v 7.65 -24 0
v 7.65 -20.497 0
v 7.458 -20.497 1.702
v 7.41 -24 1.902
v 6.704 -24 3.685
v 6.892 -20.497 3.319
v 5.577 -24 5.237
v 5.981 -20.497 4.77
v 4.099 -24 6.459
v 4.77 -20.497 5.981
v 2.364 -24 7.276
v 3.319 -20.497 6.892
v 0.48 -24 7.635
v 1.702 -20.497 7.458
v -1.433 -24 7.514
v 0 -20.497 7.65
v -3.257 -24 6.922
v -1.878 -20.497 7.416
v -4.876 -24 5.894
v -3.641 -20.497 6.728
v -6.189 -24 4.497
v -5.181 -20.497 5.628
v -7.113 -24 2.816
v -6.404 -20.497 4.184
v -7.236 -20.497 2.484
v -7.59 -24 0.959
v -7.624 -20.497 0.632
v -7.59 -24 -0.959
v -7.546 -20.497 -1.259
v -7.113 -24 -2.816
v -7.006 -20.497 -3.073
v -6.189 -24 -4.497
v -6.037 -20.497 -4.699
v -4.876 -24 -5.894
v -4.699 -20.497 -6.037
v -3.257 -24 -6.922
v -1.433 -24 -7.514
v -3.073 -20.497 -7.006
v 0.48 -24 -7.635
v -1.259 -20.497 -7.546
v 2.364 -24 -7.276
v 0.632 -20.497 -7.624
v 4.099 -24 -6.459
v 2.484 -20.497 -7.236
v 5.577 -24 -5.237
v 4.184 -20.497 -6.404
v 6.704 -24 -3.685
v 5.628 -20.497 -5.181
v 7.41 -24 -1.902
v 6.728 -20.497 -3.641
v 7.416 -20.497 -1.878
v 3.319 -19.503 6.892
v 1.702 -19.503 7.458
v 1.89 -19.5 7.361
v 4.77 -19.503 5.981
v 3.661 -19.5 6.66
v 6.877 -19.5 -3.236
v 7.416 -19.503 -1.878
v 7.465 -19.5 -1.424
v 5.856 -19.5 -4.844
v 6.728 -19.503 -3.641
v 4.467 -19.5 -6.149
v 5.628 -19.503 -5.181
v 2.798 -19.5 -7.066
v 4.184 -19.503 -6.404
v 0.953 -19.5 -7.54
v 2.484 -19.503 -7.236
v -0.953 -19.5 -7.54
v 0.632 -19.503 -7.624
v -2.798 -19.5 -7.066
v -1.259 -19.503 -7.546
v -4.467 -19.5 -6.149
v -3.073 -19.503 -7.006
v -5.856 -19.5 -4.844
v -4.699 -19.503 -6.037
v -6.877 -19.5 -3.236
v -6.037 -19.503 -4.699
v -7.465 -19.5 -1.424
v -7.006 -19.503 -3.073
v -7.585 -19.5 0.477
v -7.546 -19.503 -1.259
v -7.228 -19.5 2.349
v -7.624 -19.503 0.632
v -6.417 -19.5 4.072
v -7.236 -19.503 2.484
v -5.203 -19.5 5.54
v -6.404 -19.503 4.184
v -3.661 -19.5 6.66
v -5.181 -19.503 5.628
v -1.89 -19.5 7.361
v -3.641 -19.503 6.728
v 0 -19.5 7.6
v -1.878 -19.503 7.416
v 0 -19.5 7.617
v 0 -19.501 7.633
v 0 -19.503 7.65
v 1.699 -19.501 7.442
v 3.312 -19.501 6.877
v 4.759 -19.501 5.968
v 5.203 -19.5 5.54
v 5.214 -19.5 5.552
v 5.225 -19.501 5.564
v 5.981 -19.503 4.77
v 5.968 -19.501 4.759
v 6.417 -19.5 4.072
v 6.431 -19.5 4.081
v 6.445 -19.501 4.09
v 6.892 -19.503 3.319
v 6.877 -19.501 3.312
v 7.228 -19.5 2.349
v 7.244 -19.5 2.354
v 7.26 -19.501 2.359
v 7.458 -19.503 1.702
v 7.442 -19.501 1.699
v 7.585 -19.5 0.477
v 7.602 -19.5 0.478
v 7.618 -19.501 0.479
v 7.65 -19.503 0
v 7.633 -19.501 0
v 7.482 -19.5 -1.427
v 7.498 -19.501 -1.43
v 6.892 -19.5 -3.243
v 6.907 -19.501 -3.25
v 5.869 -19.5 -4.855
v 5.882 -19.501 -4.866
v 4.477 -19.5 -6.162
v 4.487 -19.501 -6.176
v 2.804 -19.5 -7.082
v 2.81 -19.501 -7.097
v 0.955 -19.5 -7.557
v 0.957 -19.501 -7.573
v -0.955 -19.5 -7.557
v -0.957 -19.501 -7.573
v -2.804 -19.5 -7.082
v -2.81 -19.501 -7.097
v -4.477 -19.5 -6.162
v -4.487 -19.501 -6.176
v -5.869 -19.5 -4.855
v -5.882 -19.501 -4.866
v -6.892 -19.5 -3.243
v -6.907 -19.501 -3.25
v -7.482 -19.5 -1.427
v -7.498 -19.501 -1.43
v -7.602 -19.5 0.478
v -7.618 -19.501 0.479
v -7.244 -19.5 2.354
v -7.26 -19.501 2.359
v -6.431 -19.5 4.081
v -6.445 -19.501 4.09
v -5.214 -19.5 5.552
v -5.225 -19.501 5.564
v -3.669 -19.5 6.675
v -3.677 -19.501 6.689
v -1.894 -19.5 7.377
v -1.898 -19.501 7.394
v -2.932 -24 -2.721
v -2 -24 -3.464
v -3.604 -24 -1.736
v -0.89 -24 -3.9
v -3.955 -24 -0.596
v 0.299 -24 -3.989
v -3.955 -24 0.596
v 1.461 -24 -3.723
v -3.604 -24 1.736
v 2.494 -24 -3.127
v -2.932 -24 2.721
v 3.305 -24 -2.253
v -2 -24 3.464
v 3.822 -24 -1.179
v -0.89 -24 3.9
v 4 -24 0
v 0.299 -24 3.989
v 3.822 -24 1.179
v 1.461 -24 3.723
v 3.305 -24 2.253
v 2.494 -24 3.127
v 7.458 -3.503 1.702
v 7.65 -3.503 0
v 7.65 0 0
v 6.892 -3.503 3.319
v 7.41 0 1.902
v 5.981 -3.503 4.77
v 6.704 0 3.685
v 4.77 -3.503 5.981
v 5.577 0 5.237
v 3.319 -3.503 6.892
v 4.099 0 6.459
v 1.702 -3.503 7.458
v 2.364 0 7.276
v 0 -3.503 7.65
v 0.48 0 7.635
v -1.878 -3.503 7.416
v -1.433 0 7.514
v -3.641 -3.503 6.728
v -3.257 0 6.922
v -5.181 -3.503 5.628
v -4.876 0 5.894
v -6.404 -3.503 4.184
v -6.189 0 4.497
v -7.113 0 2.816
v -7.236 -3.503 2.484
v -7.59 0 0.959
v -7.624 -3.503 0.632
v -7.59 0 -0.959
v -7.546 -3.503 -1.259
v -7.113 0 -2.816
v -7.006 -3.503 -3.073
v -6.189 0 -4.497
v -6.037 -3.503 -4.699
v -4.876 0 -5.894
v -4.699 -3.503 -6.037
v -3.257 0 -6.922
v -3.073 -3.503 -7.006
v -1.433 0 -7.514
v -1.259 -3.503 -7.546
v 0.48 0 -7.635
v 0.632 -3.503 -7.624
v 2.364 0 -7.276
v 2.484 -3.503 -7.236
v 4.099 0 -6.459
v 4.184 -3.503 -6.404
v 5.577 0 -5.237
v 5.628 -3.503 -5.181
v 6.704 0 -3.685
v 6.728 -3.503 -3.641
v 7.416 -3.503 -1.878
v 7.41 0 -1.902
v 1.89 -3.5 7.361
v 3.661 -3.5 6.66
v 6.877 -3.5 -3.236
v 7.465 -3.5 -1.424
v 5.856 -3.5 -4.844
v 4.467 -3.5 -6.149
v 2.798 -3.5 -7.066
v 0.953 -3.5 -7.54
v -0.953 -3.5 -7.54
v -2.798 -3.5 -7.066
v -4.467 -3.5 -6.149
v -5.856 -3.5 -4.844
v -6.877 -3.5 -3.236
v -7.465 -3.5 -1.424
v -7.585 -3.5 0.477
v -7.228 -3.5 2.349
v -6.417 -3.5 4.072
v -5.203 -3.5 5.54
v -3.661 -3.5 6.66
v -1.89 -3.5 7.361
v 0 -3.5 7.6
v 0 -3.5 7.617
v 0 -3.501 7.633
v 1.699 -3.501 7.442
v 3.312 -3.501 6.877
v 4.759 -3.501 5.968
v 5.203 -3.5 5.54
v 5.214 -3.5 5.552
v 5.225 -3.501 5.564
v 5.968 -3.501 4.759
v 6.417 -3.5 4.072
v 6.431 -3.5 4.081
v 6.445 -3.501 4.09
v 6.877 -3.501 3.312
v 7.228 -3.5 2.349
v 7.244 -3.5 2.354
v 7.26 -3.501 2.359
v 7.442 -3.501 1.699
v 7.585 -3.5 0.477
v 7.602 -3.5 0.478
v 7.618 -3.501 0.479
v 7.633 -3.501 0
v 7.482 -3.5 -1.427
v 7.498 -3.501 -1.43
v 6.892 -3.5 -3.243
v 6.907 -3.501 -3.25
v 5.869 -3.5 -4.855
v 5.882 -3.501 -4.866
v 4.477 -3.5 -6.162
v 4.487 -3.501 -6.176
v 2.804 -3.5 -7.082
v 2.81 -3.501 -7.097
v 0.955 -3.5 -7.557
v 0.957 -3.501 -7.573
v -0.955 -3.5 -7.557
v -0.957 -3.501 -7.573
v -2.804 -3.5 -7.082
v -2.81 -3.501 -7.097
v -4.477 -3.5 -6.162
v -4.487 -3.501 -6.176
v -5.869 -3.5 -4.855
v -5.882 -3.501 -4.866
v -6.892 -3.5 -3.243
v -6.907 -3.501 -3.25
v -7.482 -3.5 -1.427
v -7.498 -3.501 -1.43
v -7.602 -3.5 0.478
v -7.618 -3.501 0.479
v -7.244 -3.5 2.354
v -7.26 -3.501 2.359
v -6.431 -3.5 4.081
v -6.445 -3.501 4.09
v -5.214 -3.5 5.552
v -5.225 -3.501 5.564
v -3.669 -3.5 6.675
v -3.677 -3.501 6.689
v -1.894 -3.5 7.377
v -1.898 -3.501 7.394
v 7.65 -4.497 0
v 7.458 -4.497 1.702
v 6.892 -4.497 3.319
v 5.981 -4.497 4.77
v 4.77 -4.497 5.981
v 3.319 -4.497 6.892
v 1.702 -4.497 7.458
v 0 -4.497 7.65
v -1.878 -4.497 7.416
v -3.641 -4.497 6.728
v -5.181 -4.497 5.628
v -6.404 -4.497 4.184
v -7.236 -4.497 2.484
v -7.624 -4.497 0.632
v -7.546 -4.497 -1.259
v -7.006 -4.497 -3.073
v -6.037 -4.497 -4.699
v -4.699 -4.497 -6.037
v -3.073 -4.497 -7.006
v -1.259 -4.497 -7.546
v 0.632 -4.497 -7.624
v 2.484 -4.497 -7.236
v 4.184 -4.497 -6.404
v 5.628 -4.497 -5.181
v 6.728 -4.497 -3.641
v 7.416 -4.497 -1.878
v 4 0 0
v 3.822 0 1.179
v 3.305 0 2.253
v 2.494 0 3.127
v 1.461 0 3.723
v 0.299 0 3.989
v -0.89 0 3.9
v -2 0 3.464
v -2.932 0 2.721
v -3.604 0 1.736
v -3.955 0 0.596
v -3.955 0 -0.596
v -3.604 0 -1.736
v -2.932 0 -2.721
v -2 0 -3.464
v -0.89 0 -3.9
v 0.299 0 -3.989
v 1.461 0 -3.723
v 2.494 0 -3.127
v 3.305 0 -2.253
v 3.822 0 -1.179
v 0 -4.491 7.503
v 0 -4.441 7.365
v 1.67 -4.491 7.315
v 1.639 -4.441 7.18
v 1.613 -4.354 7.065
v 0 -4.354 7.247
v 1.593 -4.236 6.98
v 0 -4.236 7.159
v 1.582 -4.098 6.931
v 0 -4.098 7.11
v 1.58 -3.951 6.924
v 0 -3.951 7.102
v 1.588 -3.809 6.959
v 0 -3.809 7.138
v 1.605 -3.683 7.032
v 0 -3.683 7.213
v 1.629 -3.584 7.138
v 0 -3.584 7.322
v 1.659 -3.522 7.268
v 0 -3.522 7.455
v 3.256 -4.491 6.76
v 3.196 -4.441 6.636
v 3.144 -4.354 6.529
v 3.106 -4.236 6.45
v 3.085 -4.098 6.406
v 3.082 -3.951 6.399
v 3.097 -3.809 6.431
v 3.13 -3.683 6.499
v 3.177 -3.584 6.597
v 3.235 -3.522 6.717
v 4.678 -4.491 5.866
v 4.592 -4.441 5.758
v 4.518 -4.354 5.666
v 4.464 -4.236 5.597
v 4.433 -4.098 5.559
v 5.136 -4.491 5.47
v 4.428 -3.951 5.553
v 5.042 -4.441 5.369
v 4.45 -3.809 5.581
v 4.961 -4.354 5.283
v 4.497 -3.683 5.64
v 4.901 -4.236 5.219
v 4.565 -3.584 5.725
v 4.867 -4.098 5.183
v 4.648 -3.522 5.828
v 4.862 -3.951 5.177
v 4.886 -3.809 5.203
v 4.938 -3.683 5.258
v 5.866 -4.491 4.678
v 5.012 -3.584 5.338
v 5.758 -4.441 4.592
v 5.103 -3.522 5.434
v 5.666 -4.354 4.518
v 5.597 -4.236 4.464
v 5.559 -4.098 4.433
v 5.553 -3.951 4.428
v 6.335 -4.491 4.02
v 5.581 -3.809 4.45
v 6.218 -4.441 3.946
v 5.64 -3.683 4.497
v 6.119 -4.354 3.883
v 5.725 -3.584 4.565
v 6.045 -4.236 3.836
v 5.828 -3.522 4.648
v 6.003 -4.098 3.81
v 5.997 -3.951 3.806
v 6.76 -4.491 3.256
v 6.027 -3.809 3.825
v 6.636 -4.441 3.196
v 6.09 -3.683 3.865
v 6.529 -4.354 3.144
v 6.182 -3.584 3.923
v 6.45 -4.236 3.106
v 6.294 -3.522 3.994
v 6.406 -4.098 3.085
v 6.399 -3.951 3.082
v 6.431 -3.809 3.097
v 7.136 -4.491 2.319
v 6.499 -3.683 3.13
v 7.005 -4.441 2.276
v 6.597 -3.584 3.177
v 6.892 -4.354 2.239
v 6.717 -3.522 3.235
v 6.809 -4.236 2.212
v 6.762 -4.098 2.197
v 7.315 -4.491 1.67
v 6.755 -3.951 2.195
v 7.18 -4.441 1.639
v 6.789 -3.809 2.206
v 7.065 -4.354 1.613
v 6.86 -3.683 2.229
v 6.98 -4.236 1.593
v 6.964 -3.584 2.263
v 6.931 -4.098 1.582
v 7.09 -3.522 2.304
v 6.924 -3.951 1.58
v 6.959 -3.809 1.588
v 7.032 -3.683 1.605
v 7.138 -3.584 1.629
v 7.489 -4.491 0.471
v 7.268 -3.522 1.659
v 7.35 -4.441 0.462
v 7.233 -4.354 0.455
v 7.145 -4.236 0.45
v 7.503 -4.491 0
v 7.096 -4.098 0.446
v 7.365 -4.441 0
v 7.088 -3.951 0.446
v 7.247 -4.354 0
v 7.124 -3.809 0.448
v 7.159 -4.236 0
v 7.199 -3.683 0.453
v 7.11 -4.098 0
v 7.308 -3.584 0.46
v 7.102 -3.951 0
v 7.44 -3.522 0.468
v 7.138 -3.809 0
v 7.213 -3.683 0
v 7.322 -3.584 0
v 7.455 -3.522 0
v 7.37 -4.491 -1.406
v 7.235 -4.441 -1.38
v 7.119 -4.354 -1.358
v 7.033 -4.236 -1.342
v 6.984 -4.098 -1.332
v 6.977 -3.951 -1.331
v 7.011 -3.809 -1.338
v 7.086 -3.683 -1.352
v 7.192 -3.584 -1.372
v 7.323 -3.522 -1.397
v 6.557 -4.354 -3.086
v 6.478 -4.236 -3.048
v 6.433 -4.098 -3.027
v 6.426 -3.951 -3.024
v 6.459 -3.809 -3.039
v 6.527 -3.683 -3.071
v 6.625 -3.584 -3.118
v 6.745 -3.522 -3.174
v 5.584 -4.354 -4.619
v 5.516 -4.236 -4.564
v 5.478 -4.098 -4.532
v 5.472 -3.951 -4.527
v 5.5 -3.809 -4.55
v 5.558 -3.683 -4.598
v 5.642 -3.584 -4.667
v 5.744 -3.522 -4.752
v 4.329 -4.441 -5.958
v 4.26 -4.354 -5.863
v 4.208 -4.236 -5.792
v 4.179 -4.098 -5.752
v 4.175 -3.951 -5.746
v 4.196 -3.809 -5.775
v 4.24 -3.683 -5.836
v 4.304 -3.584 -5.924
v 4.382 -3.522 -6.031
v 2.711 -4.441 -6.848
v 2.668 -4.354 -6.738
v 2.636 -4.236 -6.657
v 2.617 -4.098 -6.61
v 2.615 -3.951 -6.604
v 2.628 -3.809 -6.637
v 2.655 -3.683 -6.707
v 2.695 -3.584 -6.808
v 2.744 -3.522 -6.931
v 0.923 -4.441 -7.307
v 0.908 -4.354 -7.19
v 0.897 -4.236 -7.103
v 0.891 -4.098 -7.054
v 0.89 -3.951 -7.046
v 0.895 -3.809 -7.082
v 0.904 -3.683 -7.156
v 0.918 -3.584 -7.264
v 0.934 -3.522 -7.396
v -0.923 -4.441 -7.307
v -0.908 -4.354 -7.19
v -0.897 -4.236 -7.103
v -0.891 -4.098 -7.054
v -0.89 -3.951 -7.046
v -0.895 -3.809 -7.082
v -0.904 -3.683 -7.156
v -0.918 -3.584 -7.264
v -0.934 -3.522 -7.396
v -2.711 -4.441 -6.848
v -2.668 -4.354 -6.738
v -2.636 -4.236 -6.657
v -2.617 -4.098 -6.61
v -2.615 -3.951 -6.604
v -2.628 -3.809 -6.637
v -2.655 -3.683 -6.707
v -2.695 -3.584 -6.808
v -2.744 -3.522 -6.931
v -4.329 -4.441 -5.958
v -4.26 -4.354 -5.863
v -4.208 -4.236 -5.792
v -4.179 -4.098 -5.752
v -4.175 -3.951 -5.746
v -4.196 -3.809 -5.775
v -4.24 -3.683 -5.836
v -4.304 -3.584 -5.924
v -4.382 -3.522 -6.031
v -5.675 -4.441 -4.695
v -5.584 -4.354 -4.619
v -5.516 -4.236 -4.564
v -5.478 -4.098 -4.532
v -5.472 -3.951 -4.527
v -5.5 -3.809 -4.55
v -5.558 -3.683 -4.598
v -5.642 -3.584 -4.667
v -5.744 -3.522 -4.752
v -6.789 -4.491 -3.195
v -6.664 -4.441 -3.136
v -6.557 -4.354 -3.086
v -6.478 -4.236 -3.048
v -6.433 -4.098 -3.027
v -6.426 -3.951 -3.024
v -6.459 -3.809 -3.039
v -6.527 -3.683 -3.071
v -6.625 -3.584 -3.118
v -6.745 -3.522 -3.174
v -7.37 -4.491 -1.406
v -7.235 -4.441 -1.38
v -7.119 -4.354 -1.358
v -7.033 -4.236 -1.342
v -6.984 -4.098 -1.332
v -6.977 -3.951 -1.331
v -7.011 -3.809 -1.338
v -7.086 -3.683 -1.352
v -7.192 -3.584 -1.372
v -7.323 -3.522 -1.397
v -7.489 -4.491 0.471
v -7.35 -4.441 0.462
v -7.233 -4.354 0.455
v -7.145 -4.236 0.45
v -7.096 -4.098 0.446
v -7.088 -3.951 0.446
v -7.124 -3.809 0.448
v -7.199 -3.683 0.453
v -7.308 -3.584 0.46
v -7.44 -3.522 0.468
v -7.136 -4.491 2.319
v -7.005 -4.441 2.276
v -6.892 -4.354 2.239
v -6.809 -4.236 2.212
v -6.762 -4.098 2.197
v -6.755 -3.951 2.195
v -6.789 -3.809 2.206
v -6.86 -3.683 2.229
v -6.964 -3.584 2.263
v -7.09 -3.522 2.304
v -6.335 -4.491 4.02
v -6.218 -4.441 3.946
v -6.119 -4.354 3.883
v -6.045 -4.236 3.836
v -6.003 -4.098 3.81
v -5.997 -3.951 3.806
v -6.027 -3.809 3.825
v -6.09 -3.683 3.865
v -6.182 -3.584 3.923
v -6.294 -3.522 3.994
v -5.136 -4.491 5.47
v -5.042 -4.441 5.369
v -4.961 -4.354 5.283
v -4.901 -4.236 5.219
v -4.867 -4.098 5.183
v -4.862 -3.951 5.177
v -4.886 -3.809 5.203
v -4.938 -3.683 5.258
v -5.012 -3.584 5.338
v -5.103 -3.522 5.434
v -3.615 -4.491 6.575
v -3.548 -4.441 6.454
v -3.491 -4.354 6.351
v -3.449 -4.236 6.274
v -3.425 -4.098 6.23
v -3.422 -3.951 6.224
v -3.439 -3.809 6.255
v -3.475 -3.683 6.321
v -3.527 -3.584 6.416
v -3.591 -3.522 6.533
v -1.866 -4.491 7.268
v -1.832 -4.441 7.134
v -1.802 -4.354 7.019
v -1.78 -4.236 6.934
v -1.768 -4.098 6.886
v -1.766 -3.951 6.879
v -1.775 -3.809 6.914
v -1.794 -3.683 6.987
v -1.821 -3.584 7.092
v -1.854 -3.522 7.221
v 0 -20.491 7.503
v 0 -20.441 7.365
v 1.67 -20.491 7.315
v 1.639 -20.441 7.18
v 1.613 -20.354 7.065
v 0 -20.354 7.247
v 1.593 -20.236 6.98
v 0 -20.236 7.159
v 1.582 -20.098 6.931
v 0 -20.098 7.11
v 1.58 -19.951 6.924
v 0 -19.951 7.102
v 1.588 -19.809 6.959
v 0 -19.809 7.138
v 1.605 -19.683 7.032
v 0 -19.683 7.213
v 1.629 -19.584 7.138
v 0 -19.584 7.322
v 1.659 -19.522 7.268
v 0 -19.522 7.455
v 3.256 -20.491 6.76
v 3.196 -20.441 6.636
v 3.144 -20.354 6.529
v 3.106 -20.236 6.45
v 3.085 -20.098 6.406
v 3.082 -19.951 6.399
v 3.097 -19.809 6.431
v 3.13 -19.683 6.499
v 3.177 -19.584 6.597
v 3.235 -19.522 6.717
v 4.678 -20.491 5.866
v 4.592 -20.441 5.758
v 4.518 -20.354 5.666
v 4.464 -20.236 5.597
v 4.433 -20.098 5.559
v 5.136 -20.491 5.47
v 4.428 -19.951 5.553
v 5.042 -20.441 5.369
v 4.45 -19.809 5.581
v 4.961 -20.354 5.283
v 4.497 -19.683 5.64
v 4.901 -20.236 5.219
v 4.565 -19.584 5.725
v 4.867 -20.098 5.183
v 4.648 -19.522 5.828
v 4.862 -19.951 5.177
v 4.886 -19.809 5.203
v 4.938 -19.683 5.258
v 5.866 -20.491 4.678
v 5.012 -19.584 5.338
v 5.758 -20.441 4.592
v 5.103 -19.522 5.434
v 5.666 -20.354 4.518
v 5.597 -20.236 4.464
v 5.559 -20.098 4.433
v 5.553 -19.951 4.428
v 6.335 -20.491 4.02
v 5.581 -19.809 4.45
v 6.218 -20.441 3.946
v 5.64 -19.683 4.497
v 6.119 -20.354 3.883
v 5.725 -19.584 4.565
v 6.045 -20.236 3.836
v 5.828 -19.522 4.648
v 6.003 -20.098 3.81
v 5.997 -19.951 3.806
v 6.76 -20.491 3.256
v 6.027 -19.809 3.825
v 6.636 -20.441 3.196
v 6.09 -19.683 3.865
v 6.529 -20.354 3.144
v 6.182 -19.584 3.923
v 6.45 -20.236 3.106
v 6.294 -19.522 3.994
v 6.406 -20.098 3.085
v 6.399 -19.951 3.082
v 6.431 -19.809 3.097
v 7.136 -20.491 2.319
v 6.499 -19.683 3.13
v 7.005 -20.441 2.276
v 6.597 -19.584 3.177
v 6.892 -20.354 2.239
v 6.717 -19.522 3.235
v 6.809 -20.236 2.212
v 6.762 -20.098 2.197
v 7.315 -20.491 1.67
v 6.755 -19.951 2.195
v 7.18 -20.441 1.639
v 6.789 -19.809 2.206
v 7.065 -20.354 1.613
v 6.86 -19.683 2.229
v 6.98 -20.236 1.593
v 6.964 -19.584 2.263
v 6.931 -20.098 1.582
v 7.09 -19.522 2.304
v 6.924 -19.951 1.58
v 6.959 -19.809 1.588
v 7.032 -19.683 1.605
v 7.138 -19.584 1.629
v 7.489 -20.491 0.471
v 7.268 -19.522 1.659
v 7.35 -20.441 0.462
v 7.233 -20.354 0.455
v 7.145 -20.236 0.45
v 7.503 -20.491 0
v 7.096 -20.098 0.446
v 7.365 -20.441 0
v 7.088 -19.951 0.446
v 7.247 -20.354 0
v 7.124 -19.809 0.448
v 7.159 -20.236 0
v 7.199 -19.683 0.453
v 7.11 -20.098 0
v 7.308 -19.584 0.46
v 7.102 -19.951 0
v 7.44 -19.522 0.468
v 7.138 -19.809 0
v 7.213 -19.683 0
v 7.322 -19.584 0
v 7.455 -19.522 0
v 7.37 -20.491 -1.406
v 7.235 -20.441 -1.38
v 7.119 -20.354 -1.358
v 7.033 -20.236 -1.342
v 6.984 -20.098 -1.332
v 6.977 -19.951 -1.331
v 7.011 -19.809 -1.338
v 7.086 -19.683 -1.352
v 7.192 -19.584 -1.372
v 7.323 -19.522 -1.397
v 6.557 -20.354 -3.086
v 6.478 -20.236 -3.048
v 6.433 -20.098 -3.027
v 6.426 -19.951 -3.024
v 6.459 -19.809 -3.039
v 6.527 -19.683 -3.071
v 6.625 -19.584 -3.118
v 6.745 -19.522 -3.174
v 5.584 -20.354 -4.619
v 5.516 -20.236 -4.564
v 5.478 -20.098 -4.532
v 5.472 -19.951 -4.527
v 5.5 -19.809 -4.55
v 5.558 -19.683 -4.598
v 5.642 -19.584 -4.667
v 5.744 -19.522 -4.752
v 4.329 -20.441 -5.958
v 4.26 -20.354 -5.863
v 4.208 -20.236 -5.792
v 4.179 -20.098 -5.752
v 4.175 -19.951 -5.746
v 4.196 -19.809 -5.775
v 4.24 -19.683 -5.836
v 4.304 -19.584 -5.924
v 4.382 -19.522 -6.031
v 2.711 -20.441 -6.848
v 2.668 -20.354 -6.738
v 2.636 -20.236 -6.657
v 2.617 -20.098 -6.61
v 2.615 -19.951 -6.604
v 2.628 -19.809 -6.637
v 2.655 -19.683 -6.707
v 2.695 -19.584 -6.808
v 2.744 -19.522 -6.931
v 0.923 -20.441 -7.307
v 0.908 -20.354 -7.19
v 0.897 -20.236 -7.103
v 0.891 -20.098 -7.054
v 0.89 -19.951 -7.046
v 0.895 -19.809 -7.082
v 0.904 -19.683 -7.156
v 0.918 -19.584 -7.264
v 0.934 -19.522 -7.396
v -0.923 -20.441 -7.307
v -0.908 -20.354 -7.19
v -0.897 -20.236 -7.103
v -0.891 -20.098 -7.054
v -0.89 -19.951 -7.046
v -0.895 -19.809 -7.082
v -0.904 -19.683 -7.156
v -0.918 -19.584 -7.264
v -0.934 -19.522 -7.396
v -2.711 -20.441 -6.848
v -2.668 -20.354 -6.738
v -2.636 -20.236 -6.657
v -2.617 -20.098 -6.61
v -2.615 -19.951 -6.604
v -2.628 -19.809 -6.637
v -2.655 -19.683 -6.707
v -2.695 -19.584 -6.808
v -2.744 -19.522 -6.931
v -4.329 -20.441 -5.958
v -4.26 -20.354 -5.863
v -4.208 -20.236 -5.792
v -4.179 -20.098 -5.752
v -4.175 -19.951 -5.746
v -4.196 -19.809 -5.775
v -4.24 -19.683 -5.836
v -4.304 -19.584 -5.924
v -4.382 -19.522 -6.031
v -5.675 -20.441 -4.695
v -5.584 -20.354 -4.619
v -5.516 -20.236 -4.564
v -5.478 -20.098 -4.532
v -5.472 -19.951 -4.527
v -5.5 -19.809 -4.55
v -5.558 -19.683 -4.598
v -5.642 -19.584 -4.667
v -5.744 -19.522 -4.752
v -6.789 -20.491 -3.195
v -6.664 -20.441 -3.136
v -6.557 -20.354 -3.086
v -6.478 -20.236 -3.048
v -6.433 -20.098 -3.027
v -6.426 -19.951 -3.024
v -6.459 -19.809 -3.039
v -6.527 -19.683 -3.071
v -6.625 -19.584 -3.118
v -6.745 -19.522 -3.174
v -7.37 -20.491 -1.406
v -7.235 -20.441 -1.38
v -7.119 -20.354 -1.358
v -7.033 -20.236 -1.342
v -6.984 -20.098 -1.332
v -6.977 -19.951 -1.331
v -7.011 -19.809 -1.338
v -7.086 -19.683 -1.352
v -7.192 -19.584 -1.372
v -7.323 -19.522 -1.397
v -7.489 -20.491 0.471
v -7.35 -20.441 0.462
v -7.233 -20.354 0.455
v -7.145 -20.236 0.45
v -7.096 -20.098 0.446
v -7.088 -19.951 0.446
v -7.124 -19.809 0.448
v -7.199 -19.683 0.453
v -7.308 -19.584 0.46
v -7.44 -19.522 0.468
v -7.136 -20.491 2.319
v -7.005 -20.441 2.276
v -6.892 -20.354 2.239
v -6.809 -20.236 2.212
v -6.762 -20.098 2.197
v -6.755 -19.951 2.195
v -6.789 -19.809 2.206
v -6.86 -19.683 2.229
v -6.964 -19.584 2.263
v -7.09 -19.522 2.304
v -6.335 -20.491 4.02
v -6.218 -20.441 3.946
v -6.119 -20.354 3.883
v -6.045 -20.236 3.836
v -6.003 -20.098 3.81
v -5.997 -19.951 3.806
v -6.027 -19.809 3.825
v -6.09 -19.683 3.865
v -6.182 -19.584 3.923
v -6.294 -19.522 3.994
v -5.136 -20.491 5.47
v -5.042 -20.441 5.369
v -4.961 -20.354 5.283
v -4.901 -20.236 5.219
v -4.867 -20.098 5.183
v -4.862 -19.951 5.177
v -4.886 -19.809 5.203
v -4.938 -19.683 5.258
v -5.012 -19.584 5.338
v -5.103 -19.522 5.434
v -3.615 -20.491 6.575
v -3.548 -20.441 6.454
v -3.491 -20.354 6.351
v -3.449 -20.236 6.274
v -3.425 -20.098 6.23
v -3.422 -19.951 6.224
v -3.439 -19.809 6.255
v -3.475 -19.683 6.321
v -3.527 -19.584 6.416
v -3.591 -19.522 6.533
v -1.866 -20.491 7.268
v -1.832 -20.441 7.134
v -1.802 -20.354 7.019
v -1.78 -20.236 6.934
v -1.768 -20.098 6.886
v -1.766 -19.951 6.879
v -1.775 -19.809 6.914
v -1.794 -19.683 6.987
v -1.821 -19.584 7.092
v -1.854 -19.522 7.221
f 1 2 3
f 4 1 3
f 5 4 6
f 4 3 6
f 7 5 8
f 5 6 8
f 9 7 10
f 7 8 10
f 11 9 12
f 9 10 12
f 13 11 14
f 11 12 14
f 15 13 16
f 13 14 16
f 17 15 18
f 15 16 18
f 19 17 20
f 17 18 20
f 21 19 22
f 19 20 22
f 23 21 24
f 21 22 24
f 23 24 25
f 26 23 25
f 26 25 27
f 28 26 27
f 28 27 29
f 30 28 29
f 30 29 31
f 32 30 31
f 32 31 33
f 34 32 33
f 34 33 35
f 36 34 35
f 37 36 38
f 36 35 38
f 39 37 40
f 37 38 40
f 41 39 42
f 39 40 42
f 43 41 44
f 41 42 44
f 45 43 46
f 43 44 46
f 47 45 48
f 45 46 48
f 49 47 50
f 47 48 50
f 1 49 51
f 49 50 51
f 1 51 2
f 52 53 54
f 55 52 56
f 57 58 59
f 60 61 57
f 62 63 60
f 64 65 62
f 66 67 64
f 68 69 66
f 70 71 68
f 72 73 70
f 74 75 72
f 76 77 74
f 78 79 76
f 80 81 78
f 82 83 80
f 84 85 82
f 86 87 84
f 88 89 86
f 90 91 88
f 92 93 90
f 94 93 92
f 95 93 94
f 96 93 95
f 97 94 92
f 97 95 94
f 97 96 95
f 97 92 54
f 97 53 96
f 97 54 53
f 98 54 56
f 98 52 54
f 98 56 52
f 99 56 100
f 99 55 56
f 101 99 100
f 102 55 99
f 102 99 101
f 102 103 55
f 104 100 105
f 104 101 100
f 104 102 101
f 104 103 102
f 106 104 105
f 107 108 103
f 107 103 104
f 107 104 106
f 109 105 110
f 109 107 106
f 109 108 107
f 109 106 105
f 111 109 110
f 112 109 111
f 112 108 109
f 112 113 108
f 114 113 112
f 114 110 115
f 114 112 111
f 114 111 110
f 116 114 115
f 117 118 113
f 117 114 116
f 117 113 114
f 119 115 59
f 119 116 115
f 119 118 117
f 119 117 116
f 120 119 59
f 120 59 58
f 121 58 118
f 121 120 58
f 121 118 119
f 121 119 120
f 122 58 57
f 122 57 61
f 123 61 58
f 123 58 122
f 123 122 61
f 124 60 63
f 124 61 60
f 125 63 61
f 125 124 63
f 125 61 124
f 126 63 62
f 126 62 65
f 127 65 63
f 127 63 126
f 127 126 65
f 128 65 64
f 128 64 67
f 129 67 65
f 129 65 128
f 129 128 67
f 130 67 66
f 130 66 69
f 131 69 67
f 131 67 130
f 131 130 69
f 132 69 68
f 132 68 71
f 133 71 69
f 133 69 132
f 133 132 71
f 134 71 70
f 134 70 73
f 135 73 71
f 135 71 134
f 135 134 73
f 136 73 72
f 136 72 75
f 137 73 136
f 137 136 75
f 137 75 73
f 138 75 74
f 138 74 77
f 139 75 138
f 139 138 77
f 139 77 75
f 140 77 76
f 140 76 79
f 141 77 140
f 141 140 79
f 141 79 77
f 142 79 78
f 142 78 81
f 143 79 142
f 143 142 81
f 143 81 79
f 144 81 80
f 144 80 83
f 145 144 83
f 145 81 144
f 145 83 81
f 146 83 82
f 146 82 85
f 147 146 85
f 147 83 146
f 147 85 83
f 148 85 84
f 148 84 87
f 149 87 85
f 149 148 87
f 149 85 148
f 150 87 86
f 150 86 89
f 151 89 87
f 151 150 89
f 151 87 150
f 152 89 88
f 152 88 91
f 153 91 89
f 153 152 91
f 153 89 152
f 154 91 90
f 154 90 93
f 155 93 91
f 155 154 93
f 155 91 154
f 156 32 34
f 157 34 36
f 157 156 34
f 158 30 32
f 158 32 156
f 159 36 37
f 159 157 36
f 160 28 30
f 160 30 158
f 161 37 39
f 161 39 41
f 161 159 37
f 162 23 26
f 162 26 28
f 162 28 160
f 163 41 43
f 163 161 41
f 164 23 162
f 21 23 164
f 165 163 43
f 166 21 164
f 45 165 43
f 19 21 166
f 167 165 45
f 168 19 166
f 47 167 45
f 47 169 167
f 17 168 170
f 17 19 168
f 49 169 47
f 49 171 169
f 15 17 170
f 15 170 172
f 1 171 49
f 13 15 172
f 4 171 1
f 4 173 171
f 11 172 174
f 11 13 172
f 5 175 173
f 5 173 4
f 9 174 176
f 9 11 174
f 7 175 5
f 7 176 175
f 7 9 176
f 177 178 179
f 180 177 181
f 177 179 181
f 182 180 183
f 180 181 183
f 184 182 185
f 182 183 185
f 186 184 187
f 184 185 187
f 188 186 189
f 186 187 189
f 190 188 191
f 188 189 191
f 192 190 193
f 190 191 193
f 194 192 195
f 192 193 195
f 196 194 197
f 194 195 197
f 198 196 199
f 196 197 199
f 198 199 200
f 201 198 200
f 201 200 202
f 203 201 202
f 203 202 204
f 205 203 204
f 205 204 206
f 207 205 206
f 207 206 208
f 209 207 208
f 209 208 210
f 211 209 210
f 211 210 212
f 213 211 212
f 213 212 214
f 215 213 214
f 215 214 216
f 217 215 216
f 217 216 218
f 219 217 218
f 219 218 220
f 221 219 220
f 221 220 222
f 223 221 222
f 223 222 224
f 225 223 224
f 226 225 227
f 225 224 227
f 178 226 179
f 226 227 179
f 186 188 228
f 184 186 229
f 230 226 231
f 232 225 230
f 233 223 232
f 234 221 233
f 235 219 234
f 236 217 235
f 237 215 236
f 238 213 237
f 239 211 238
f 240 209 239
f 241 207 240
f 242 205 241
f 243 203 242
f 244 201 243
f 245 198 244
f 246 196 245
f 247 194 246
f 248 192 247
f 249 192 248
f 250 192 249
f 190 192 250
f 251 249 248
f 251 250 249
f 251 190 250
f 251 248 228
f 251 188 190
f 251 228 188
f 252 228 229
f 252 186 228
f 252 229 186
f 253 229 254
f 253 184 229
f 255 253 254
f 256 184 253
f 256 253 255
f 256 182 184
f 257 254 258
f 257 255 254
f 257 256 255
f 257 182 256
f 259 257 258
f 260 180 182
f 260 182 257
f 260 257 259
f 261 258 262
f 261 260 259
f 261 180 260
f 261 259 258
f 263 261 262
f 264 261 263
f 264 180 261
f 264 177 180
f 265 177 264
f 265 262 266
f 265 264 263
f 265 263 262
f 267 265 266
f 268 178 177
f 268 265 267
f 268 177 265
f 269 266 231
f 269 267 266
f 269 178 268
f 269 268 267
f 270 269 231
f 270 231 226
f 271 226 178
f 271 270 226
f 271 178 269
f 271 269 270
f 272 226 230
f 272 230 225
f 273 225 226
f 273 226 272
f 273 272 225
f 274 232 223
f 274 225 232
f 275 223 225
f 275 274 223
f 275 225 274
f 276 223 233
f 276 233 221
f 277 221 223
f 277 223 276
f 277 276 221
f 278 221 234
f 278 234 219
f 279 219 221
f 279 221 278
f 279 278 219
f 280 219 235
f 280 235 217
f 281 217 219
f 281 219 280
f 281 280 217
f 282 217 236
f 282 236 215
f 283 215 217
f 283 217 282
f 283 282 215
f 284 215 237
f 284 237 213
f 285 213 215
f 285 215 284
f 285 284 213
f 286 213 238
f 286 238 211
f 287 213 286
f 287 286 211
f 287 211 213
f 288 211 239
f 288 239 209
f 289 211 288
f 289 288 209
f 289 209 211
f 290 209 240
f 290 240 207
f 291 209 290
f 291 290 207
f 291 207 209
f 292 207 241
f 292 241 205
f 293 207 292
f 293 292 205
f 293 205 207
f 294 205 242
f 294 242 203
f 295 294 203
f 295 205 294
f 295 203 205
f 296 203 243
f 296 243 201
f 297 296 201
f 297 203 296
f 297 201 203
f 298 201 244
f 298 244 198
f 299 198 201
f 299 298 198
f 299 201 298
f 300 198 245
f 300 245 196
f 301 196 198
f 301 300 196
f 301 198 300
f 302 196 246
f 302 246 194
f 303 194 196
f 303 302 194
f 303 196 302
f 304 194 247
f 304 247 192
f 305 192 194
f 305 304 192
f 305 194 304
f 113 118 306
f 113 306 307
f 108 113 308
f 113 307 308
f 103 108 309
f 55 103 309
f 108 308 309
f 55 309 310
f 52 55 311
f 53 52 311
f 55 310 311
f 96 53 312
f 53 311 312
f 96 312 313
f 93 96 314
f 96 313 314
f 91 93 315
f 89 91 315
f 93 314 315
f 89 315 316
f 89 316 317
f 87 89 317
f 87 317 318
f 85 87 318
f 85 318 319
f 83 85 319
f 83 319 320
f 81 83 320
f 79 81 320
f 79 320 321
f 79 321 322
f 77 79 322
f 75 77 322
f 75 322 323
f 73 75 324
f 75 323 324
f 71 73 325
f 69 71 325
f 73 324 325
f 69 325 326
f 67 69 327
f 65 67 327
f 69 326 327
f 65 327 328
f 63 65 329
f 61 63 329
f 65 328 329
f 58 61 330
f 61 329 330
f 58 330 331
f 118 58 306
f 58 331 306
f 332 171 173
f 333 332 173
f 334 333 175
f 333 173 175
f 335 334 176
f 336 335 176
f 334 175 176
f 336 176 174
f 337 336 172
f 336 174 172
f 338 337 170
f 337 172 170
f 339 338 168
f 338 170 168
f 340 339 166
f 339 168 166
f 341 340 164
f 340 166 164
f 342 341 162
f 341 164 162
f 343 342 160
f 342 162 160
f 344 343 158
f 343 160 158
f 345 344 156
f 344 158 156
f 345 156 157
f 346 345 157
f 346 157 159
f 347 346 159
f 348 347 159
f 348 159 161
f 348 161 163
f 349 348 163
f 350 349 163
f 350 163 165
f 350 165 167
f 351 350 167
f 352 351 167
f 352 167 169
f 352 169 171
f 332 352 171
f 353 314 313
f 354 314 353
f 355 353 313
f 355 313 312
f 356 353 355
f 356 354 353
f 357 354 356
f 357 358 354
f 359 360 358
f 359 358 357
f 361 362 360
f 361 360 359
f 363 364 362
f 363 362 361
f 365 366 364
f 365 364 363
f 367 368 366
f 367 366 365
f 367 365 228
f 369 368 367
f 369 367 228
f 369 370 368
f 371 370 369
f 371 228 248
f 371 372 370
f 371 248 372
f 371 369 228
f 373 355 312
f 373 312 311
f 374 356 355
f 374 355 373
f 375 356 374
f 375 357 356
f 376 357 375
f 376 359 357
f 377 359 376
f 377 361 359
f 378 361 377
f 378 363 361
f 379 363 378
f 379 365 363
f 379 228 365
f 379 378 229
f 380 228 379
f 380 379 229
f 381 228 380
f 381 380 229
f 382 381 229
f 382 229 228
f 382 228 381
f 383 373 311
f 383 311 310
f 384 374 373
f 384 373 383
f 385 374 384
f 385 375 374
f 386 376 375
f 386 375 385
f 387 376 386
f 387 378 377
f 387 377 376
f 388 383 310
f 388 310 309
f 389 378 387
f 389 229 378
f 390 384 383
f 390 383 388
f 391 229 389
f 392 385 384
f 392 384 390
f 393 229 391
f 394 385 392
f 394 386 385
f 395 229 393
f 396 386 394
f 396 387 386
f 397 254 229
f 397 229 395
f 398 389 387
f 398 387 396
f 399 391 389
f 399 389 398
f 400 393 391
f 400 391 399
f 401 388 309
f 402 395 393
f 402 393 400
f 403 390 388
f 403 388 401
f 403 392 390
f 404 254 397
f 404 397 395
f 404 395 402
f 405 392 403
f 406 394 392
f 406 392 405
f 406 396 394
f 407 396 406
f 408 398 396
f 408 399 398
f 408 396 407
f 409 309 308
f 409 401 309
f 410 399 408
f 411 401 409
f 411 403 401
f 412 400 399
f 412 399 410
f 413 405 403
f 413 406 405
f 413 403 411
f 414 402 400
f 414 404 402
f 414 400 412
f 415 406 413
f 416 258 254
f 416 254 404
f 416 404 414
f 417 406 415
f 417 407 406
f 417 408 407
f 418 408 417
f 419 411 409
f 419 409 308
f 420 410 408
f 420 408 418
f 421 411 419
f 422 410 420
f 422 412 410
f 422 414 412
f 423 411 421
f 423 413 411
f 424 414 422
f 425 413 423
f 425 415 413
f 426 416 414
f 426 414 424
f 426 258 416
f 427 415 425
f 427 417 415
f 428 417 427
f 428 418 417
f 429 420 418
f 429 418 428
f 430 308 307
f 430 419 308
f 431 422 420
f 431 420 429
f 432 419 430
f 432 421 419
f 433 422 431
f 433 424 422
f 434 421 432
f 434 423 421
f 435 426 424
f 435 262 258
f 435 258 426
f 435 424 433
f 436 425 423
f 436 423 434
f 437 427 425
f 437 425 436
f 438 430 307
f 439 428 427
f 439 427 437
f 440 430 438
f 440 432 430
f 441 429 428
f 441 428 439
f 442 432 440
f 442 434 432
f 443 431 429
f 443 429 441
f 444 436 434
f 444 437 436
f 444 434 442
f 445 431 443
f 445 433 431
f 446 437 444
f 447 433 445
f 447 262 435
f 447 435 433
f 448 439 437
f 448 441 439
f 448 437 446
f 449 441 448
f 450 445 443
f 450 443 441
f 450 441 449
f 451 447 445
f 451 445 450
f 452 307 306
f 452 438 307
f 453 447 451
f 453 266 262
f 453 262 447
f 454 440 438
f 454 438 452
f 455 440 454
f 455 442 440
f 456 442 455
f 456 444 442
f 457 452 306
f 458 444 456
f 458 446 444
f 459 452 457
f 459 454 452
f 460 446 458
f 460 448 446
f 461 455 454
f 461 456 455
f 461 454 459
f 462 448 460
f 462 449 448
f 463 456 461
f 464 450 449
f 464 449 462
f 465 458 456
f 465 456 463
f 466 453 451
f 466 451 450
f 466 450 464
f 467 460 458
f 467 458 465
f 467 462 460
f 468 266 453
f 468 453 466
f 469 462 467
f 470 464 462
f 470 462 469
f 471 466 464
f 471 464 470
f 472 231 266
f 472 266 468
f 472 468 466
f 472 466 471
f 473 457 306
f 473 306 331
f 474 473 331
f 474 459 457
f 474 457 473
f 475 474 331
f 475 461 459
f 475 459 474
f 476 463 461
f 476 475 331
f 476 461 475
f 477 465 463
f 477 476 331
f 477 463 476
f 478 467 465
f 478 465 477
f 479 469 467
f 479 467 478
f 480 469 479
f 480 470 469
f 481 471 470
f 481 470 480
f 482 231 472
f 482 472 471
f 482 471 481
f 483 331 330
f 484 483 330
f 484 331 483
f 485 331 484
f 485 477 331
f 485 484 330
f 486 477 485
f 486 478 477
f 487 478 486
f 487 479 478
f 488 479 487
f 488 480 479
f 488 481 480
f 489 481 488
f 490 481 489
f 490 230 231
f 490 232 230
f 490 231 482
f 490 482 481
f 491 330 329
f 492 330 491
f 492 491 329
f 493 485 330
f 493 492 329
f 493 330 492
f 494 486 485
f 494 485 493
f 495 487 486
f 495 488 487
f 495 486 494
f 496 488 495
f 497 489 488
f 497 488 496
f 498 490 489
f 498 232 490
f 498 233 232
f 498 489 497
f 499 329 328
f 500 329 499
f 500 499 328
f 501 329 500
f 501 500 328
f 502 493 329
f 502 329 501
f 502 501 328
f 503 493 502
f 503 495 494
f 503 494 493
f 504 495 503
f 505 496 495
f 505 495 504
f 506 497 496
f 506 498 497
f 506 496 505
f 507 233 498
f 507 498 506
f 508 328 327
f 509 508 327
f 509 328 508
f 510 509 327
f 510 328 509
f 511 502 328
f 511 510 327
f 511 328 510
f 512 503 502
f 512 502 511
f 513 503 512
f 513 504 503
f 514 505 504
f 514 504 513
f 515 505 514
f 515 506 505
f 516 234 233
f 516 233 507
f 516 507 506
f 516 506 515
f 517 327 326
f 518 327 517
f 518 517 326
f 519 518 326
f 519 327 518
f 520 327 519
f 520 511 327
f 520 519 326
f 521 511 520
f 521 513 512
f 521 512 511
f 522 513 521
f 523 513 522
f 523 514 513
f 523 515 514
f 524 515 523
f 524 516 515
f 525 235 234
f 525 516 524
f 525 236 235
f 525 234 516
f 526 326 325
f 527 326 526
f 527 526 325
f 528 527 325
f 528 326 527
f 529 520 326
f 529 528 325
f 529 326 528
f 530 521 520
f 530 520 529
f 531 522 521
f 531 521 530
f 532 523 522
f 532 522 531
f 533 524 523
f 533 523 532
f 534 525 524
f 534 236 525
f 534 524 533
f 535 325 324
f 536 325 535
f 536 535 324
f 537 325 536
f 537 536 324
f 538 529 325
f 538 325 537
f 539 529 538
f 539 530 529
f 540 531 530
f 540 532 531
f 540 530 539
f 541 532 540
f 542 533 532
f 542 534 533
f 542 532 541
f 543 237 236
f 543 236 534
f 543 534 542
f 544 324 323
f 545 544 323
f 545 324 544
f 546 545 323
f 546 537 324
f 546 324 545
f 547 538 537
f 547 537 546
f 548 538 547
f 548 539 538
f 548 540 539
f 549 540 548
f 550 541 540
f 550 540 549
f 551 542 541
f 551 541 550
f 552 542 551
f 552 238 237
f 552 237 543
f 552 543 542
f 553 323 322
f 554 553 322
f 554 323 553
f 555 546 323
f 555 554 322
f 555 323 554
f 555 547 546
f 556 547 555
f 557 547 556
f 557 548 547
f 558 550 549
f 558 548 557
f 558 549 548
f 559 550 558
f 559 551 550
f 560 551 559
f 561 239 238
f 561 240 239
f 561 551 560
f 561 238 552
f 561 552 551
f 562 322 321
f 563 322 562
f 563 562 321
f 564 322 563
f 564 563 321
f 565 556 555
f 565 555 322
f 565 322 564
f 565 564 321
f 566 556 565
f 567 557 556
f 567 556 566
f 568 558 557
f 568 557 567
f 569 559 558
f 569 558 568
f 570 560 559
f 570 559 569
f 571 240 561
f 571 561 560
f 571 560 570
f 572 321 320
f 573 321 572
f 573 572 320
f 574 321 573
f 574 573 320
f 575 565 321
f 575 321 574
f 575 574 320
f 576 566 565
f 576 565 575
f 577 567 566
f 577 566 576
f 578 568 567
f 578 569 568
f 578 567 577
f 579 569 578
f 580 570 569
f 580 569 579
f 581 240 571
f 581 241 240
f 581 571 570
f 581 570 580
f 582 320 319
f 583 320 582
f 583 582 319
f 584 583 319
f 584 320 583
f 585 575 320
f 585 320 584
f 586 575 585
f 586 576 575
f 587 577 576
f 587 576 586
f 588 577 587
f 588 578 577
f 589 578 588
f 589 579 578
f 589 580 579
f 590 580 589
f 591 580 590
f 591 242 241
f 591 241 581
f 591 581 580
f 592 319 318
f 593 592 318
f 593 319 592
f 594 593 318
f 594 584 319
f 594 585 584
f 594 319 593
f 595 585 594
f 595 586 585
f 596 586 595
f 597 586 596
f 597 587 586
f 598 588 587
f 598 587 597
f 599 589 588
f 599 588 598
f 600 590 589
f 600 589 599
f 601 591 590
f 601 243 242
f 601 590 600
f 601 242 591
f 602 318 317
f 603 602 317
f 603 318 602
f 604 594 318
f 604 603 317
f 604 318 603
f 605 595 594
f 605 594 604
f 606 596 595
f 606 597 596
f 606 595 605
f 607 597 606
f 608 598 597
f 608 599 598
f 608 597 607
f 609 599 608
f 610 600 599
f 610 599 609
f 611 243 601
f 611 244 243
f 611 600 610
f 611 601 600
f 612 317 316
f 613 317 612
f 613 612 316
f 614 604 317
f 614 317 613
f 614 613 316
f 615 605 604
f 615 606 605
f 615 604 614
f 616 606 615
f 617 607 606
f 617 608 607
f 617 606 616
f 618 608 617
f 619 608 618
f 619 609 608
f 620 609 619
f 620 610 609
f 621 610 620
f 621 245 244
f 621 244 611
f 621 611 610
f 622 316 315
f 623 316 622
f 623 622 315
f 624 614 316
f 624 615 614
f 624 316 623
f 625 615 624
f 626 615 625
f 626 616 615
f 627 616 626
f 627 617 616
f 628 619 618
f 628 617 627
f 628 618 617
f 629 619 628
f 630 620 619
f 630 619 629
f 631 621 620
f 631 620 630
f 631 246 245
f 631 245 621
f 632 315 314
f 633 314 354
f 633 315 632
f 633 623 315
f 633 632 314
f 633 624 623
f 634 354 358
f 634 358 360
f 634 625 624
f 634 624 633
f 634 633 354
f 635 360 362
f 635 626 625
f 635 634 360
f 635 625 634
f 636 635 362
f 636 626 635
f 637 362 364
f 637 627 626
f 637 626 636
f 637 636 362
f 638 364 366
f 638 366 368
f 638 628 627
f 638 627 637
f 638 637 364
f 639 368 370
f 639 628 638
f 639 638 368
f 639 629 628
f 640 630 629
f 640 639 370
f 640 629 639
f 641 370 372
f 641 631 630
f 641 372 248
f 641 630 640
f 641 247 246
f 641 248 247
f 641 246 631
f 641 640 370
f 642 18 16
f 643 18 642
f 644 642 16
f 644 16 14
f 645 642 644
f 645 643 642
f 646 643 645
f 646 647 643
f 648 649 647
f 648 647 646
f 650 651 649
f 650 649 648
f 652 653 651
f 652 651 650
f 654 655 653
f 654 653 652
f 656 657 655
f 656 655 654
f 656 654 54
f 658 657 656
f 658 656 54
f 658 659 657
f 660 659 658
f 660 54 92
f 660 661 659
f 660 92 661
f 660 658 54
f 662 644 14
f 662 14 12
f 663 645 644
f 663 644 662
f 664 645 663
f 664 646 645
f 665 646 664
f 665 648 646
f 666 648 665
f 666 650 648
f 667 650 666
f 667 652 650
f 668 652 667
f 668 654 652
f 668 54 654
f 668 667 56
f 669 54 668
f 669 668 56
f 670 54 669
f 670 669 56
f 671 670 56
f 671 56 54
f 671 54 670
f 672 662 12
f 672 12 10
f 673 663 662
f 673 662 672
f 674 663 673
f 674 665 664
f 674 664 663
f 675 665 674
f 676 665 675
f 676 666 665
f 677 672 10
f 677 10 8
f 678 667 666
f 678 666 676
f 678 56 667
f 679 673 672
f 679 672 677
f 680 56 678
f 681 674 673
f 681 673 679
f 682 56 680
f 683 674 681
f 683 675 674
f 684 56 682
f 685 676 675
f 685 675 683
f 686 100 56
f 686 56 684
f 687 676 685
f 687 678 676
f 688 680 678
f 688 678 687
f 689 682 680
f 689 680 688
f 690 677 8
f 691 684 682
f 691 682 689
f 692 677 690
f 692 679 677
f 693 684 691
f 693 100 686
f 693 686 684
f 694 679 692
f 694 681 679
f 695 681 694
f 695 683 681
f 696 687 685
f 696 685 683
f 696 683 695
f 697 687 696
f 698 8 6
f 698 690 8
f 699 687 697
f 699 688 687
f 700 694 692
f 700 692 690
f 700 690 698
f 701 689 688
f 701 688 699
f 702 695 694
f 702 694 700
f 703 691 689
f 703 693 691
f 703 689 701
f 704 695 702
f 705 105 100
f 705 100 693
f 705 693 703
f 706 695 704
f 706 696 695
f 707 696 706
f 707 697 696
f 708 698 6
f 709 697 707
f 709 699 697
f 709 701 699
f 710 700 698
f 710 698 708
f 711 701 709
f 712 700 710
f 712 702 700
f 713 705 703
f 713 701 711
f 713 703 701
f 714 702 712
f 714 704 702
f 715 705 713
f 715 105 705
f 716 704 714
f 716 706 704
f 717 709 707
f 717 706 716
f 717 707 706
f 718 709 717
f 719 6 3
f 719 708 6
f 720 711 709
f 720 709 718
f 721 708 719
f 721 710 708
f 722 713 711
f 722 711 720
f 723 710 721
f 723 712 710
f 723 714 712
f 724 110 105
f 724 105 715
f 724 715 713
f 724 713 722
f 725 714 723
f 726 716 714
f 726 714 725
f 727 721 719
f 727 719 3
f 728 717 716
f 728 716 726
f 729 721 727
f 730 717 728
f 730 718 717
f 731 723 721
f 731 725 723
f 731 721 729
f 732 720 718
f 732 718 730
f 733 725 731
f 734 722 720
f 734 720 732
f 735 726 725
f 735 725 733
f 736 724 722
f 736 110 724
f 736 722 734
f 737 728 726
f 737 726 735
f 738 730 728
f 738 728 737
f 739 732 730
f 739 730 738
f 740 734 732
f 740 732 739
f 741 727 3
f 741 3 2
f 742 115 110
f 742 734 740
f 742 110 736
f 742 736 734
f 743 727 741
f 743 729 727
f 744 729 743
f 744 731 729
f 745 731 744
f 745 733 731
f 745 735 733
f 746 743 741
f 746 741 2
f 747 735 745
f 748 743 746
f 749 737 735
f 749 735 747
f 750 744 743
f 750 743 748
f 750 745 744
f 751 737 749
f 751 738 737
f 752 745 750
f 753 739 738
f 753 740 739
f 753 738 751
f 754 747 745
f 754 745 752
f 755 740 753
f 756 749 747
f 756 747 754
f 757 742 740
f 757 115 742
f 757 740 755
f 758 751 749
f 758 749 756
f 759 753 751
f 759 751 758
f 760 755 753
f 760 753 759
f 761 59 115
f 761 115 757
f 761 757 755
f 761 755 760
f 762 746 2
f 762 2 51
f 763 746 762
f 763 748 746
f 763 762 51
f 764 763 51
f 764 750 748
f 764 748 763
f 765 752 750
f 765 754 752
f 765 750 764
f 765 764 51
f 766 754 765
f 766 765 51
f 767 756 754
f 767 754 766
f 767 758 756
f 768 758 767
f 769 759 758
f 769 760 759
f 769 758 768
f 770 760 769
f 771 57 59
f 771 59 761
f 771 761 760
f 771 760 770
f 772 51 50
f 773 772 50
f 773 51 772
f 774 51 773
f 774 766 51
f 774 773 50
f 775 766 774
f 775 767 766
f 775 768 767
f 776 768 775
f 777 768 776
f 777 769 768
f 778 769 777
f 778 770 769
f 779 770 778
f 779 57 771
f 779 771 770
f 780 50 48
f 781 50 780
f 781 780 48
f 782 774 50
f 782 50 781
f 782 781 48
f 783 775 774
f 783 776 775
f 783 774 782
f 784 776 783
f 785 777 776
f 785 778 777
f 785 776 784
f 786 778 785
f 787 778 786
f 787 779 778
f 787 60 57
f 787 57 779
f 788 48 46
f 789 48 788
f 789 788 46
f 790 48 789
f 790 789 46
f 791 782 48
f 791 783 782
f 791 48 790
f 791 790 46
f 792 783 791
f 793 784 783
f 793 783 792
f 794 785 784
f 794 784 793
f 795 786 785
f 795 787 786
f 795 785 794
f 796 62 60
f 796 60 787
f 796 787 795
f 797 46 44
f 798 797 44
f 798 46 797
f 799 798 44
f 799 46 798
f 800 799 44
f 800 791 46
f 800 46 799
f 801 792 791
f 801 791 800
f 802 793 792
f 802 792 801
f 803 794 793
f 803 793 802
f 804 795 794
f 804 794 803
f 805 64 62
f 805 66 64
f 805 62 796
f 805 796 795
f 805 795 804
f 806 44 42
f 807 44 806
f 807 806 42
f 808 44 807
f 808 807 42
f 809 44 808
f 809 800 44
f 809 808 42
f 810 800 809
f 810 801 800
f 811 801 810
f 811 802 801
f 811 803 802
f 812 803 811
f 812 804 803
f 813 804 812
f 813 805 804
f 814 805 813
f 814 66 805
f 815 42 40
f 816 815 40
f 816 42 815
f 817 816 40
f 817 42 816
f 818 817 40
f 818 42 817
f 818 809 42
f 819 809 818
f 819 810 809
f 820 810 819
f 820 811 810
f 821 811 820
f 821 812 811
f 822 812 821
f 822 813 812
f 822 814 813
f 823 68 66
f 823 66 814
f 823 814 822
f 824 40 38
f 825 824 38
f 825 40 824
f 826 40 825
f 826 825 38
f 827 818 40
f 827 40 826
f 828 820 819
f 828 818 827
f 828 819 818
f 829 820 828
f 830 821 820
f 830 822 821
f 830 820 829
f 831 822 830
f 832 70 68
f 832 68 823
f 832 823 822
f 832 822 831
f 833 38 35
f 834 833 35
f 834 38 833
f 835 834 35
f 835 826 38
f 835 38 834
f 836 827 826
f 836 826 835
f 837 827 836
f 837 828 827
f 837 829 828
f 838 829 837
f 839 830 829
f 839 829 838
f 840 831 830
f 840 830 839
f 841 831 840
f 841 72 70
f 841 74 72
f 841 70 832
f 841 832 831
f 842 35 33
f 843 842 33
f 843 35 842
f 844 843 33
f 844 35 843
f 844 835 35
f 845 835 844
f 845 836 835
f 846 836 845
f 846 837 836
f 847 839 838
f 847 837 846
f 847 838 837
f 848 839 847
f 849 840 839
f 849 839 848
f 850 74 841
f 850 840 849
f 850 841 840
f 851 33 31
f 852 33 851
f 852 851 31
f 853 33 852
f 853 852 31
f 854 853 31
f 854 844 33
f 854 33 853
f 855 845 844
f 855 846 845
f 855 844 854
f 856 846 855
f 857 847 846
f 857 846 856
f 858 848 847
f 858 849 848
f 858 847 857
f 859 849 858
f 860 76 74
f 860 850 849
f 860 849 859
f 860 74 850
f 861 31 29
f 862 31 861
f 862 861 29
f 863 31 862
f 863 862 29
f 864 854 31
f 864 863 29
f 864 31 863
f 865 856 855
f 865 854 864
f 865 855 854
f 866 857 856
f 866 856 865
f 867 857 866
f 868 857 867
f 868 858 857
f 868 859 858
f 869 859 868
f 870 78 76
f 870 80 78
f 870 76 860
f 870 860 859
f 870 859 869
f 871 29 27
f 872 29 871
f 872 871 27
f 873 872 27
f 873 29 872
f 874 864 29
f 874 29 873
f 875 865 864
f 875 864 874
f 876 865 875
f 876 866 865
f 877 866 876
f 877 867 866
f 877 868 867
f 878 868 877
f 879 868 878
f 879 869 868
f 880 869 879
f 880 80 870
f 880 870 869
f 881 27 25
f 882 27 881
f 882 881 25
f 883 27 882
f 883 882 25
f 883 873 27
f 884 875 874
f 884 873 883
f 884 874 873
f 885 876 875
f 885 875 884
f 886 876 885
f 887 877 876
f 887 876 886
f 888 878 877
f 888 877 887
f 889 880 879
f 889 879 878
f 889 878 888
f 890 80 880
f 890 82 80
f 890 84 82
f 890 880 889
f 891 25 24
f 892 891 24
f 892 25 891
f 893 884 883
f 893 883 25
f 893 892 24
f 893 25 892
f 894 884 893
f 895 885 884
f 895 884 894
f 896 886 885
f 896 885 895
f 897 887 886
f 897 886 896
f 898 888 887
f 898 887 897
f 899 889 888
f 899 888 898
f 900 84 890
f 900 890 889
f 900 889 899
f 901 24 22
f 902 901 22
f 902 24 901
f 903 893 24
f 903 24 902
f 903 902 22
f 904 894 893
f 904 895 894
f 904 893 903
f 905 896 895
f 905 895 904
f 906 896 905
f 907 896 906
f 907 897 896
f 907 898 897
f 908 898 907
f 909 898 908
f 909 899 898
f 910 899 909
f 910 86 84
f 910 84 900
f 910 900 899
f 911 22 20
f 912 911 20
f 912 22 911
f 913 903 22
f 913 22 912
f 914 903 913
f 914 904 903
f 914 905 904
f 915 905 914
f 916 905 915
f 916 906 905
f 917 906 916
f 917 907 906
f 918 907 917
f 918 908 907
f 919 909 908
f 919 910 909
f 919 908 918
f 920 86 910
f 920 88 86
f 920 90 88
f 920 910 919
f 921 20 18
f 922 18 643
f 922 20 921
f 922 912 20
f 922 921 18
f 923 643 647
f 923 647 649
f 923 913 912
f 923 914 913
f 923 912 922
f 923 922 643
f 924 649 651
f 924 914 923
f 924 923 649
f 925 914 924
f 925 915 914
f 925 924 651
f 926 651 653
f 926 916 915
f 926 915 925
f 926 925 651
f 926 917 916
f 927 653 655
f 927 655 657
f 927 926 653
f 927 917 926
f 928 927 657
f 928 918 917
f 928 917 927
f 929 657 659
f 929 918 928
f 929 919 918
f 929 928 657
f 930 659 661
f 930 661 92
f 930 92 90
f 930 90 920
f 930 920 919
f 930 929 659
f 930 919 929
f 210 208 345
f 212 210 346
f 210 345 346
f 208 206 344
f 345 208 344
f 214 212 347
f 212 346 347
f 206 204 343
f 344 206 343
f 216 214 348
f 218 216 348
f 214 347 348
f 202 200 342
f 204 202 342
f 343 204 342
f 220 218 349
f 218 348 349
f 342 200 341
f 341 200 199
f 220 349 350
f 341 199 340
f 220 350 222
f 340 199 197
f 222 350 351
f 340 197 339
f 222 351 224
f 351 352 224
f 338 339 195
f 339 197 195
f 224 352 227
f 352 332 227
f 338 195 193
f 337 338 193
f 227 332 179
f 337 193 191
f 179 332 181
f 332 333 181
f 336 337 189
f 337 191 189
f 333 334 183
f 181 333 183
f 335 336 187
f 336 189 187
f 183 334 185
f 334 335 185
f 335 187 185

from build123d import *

# Parameters (mm, degrees)
F0_R     = 7.65
F1_DEPTH = 24
F2_R     = 4
F3_DEPTH = 25
F4_R     = 0.5


with BuildPart() as f1:
    # F0 (on Front) → F1 (new body)
    with BuildSketch(Plane.XZ):
        Circle(F0_R)
    extrude(amount=F1_DEPTH)

    # F2 (on face) → F3 (cut)
    with BuildSketch(Plane.XZ.offset(24)):
        Circle(F2_R)
    extrude(amount=-F3_DEPTH, mode=Mode.SUBTRACT)

    # F4 (on Right) → F6 (revolve, cut)
    with BuildSketch(Plane.YZ):
        with Locations((-20, 7.6)):
            Circle(F4_R)
        with Locations((-4, 7.6)):
            Circle(F4_R)
    revolve(axis=Axis((0, -7.984612, 0), (0, 1, 0)), mode=Mode.SUBTRACT)


solid = f1.part
